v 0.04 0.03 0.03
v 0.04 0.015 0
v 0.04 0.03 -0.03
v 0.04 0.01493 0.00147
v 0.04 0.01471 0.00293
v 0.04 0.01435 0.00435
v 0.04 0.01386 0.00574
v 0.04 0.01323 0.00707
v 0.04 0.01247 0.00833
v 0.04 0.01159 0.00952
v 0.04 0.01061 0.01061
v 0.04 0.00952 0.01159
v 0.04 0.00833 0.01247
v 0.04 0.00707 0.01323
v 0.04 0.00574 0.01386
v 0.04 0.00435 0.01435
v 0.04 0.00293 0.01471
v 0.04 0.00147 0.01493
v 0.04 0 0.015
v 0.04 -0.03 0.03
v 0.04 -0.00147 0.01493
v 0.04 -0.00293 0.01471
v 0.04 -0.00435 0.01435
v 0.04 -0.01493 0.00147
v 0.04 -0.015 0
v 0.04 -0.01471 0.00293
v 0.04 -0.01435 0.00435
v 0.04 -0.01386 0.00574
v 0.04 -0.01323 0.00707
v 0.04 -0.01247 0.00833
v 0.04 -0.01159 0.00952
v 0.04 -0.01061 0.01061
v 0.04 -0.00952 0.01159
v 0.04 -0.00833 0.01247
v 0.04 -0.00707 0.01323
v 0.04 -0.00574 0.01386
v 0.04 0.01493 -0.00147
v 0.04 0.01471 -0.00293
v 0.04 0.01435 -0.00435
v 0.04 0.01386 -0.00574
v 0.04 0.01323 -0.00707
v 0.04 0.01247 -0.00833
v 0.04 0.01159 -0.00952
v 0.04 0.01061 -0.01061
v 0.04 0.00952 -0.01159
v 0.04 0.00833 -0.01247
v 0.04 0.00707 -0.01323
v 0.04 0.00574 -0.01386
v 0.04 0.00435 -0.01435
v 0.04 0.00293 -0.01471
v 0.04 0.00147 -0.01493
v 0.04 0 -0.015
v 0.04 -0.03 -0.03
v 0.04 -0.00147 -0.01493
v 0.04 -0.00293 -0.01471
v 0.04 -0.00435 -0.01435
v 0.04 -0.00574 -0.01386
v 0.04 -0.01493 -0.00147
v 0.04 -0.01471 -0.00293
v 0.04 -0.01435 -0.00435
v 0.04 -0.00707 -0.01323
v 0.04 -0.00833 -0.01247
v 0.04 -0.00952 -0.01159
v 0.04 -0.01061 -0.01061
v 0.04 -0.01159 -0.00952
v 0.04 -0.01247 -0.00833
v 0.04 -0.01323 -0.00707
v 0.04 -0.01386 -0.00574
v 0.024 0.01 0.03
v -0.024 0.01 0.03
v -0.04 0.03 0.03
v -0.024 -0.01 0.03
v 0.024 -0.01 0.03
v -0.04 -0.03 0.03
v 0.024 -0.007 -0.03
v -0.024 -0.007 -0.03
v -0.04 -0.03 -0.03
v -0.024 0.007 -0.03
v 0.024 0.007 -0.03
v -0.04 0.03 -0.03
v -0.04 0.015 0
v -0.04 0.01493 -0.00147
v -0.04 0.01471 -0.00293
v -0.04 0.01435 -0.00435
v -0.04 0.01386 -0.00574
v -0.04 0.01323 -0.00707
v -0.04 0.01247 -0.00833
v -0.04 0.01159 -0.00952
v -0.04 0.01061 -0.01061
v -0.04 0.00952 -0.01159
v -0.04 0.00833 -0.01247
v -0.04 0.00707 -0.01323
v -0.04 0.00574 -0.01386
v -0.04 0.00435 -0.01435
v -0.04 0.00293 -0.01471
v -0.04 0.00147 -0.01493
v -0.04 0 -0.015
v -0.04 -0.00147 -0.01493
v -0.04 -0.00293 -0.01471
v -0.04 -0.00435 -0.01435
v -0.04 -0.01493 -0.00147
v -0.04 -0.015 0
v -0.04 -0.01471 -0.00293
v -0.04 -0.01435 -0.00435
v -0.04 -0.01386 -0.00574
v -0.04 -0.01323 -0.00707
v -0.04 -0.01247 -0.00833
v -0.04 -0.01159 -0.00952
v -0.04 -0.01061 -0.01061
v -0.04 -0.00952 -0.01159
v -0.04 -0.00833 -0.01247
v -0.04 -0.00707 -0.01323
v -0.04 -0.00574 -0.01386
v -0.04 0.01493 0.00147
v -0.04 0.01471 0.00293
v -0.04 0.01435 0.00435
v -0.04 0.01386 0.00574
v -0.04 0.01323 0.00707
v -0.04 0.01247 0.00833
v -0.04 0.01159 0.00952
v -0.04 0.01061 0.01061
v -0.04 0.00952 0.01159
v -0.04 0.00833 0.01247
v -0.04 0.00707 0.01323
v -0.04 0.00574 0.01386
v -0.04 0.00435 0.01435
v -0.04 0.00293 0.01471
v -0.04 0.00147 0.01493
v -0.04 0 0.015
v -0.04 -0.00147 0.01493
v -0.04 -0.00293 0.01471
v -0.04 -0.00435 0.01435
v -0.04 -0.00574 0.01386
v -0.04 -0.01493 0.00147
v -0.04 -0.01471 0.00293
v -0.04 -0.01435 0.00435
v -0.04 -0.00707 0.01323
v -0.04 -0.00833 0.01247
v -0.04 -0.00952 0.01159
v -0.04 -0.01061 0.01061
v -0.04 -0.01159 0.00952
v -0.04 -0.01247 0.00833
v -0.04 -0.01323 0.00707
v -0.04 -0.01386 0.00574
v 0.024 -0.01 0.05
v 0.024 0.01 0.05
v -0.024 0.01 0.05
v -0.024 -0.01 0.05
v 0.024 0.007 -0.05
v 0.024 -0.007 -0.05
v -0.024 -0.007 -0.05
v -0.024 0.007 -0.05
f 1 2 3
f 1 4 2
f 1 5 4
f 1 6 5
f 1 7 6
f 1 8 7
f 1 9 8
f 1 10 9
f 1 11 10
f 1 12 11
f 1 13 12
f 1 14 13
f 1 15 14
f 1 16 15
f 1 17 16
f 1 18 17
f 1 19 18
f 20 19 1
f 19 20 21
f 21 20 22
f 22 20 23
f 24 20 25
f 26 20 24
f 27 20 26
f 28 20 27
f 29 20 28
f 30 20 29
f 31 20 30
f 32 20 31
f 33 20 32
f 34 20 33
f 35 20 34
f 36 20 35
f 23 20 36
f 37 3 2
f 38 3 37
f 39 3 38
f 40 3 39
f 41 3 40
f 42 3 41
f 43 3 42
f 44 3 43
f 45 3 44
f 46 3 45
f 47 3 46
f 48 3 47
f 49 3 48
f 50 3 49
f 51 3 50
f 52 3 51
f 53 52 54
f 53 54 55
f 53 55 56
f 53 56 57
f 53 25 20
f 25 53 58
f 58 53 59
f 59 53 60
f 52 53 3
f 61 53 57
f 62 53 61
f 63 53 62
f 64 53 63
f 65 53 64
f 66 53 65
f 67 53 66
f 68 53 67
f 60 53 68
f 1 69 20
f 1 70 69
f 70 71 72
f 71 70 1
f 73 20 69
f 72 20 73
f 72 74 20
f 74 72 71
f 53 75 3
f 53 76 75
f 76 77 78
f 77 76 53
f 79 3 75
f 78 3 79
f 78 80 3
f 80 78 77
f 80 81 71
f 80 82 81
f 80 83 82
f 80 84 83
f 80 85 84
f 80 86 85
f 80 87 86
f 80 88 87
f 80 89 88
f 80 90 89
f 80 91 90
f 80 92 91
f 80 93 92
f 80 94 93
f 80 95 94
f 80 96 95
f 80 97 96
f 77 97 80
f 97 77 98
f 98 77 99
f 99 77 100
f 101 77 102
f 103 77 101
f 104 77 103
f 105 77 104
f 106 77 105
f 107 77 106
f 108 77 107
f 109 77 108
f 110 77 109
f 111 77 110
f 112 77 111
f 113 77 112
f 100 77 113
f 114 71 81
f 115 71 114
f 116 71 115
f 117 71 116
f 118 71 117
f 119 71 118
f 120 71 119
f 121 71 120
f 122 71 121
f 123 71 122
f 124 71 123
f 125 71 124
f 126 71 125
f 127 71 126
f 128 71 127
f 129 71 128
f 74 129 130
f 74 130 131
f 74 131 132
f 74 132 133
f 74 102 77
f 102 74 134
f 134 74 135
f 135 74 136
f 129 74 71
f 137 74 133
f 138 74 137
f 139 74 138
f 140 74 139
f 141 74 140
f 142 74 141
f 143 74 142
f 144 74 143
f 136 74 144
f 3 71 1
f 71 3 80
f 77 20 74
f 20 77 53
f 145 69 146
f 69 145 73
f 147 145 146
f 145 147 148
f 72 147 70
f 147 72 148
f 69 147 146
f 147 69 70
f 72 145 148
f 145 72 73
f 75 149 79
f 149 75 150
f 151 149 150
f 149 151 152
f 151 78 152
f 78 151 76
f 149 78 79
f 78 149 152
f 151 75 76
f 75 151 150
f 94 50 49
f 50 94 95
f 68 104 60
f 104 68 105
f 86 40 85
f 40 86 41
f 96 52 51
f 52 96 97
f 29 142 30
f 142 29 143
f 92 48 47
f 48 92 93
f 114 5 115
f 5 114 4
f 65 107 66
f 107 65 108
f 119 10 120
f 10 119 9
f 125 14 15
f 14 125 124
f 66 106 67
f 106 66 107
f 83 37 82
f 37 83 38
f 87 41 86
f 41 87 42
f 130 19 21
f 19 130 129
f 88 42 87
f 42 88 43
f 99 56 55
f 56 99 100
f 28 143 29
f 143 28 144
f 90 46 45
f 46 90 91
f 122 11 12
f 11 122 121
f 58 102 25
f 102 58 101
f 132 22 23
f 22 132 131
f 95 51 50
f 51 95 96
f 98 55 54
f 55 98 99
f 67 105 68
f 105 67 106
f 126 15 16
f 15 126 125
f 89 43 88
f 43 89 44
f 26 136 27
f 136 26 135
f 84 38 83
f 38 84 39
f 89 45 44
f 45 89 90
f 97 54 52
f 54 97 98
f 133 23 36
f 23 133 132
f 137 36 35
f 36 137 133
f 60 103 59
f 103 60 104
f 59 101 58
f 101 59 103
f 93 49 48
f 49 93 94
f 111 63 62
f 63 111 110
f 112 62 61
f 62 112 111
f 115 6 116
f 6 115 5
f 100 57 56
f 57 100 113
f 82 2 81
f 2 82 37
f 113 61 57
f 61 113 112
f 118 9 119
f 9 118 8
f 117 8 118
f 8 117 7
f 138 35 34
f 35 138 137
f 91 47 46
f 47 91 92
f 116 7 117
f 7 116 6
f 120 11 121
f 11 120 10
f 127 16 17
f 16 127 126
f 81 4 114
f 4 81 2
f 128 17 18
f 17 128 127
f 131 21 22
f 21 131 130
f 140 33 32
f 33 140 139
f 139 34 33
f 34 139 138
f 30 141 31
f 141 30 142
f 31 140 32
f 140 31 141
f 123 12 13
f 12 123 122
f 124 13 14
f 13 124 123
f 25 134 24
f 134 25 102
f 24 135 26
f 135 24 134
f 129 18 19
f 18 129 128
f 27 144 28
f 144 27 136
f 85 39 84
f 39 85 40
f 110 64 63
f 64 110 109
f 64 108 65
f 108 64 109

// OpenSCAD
$fn=64;

size = 0.1;

body_x = 0.08;
body_y = 0.06;
body_z = 0.06;

tab_x = 0.02;
tab_y = 0.02;
tab_z = 0.02;

bore_d = 0.03;

boss_d = 0.03;
boss_len = 0.02;

module main_body() {
    union() {
        cube([body_x, body_y, body_z], center=true);

        translate([0, 0, (body_z/2 + tab_z/2)])
            cube([body_x*0.6, tab_y, tab_z], center=true);

        translate([0, 0, -(body_z/2 + tab_z/2)])
            cube([body_x*0.6, tab_y*0.7, tab_z], center=true);

        translate([body_x/2 + boss_len/2, 0, 0])
            rotate([0,90,0])
                cylinder(d=boss_d, h=boss_len, center=true);
    }
}

module through_bore() {
    rotate([0,90,0])
        cylinder(d=bore_d, h=size*2, center=true);
}

difference() {
    main_body();
    through_bore();
}
